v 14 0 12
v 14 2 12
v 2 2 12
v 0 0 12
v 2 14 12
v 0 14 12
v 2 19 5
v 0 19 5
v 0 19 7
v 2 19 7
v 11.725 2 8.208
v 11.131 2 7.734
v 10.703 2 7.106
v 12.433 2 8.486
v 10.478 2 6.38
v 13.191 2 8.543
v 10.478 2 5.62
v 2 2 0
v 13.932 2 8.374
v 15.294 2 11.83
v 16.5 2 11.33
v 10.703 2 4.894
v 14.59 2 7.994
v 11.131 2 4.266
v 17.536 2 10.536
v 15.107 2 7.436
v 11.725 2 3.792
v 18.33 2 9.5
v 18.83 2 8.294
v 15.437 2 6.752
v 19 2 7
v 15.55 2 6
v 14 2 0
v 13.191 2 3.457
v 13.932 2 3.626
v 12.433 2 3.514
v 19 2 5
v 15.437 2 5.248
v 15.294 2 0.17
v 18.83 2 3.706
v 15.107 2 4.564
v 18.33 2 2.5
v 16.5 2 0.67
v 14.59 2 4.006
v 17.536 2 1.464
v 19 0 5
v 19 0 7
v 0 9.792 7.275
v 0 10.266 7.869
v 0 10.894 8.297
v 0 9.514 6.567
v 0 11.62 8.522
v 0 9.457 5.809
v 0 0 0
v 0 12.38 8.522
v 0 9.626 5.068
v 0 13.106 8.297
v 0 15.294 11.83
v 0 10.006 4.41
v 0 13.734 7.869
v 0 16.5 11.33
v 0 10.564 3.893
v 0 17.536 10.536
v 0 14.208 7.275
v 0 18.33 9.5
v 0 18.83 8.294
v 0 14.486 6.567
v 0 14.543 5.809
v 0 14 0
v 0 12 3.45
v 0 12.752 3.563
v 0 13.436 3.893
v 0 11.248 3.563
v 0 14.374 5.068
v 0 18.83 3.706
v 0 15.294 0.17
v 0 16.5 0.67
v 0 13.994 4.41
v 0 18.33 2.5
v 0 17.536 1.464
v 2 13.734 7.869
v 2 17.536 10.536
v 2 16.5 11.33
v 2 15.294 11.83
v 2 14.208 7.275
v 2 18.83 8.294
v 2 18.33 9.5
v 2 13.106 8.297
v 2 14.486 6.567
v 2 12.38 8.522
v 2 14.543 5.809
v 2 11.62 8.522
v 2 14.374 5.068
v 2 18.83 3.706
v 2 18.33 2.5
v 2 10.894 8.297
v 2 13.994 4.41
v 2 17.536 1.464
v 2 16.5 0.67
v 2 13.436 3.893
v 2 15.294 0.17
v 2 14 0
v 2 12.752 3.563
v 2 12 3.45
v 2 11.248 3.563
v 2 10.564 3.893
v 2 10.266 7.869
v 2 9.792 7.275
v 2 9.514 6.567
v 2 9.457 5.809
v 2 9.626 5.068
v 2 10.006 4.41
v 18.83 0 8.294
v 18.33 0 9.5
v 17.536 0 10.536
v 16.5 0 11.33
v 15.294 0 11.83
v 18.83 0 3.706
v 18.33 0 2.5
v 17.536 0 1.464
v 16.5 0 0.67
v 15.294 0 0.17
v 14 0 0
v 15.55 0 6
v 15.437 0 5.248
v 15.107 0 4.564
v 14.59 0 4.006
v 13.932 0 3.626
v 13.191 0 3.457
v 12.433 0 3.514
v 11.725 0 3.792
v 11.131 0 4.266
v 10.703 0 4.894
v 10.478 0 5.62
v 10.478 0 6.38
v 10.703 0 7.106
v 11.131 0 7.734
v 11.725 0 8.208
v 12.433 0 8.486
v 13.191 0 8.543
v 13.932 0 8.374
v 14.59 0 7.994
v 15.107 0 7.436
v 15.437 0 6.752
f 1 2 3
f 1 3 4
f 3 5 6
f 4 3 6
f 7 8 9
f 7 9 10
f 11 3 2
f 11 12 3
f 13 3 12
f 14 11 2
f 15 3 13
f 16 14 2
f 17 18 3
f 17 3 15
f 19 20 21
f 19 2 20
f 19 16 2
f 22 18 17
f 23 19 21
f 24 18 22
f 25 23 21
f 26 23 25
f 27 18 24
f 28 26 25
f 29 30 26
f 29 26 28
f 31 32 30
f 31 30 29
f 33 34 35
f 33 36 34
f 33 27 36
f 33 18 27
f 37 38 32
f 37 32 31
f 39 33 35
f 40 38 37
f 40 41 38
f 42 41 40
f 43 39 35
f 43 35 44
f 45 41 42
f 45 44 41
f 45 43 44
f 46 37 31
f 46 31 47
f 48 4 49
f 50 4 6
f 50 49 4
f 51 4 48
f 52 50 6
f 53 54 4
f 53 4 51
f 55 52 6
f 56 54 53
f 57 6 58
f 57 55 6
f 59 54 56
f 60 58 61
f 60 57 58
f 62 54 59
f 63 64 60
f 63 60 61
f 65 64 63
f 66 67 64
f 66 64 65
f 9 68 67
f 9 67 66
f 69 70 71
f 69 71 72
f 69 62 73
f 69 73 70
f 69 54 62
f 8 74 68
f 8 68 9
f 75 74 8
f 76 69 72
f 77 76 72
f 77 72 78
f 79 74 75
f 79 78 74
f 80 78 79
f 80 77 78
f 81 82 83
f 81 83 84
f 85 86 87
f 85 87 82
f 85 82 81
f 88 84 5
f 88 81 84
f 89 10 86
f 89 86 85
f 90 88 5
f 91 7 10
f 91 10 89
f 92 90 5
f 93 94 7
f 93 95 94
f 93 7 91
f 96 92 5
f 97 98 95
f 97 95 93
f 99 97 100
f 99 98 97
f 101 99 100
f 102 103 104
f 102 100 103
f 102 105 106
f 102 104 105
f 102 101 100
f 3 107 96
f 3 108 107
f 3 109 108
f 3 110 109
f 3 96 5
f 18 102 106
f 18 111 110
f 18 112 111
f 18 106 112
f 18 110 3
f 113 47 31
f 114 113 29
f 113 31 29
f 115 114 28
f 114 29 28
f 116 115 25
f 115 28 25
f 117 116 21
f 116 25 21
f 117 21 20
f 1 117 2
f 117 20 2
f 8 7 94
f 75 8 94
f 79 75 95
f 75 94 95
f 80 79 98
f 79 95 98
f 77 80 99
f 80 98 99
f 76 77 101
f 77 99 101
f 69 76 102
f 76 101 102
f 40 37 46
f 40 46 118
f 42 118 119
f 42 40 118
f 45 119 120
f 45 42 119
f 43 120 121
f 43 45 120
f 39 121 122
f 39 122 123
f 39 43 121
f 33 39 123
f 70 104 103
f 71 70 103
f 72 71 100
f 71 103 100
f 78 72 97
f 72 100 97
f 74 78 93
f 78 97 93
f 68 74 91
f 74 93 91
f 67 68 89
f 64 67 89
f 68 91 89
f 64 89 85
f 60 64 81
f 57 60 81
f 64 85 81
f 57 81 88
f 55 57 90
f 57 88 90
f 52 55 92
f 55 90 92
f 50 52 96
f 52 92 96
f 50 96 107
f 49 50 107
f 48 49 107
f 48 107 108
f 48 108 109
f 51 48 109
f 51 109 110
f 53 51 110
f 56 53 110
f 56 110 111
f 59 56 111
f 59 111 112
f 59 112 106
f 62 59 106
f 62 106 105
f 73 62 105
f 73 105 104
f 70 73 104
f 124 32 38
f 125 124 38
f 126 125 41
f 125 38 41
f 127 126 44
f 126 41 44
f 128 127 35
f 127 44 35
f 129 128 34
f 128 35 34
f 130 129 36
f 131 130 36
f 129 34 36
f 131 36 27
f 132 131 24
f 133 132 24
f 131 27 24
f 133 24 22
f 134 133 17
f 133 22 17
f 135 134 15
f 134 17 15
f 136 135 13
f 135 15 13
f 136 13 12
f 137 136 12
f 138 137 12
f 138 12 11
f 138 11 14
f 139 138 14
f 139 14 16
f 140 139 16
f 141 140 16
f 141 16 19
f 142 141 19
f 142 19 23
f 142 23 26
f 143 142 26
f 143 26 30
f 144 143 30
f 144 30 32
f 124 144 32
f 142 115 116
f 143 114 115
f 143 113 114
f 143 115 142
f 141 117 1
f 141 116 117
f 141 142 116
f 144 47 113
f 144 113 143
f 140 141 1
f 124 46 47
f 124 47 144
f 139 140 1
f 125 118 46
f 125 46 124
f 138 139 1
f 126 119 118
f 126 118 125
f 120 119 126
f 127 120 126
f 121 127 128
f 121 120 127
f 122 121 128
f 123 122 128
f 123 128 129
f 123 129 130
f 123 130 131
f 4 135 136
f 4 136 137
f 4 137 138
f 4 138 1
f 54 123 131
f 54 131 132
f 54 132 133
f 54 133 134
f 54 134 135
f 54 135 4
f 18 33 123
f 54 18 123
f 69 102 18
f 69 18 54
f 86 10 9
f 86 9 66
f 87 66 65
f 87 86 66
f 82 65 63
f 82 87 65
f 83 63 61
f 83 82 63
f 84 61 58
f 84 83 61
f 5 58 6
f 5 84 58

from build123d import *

# Parameters (mm, degrees)
EXTRUDE_1_DEPTH     = 12
SKETCH_2_R          = 2.55
CUT_EXTRUDE_1_DEPTH = 3
SKETCH_3_R          = 2.55
CUT_EXTRUDE_2_DEPTH = 3


with BuildPart() as part:
    # Эскиз1 → Бобышка-Вытянуть1 (new body)
    with BuildSketch(Plane.XY):
        Polygon((0, 0), (0, 19), (2, 19), (2, 2), (19, 2), (19, 0), align=None)
    extrude(amount=EXTRUDE_1_DEPTH)

    # Эскиз2 → Вырез-Вытянуть1 (cut, through all)
    with BuildSketch(Plane(origin=(2, 0, 0), x_dir=(0, 0, -1), z_dir=(1, 0, 0))):
        with Locations((-6, 12)):
            Circle(SKETCH_2_R)
        with BuildLine():
            Line((-12, 14), (-12, 19))
            Line((-12, 19), (-7, 19))
            ThreePointArc((-7, 19), (-10.535533906, 17.535533906), (-12, 14))
        make_face()
        with BuildLine():
            Line((0, 14), (0, 19))
            Line((0, 19), (-5, 19))
            ThreePointArc((-5, 19), (-1.464466094, 17.535533906), (0, 14))
        make_face()
    extrude(amount=-CUT_EXTRUDE_1_DEPTH, mode=Mode.SUBTRACT)

    # Эскиз3 → Вырез-Вытянуть2 (cut, through all)
    with BuildSketch(Plane(origin=(0, 2, 0), x_dir=(1, 0, 0), z_dir=(0, 1, 0))):
        with Locations((13, -6)):
            Circle(SKETCH_3_R)
        with BuildLine():
            Line((14, 0), (19, 0))
            Line((19, 0), (19, -5))
            ThreePointArc((19, -5), (17.535533906, -1.464466094), (14, 0))
        make_face()
        with BuildLine():
            Line((14, -12), (19, -12))
            Line((19, -12), (19, -7))
            ThreePointArc((19, -7), (17.535533906, -10.535533906), (14, -12))
        make_face()
    extrude(amount=-CUT_EXTRUDE_2_DEPTH, mode=Mode.SUBTRACT)


solid = part.part
